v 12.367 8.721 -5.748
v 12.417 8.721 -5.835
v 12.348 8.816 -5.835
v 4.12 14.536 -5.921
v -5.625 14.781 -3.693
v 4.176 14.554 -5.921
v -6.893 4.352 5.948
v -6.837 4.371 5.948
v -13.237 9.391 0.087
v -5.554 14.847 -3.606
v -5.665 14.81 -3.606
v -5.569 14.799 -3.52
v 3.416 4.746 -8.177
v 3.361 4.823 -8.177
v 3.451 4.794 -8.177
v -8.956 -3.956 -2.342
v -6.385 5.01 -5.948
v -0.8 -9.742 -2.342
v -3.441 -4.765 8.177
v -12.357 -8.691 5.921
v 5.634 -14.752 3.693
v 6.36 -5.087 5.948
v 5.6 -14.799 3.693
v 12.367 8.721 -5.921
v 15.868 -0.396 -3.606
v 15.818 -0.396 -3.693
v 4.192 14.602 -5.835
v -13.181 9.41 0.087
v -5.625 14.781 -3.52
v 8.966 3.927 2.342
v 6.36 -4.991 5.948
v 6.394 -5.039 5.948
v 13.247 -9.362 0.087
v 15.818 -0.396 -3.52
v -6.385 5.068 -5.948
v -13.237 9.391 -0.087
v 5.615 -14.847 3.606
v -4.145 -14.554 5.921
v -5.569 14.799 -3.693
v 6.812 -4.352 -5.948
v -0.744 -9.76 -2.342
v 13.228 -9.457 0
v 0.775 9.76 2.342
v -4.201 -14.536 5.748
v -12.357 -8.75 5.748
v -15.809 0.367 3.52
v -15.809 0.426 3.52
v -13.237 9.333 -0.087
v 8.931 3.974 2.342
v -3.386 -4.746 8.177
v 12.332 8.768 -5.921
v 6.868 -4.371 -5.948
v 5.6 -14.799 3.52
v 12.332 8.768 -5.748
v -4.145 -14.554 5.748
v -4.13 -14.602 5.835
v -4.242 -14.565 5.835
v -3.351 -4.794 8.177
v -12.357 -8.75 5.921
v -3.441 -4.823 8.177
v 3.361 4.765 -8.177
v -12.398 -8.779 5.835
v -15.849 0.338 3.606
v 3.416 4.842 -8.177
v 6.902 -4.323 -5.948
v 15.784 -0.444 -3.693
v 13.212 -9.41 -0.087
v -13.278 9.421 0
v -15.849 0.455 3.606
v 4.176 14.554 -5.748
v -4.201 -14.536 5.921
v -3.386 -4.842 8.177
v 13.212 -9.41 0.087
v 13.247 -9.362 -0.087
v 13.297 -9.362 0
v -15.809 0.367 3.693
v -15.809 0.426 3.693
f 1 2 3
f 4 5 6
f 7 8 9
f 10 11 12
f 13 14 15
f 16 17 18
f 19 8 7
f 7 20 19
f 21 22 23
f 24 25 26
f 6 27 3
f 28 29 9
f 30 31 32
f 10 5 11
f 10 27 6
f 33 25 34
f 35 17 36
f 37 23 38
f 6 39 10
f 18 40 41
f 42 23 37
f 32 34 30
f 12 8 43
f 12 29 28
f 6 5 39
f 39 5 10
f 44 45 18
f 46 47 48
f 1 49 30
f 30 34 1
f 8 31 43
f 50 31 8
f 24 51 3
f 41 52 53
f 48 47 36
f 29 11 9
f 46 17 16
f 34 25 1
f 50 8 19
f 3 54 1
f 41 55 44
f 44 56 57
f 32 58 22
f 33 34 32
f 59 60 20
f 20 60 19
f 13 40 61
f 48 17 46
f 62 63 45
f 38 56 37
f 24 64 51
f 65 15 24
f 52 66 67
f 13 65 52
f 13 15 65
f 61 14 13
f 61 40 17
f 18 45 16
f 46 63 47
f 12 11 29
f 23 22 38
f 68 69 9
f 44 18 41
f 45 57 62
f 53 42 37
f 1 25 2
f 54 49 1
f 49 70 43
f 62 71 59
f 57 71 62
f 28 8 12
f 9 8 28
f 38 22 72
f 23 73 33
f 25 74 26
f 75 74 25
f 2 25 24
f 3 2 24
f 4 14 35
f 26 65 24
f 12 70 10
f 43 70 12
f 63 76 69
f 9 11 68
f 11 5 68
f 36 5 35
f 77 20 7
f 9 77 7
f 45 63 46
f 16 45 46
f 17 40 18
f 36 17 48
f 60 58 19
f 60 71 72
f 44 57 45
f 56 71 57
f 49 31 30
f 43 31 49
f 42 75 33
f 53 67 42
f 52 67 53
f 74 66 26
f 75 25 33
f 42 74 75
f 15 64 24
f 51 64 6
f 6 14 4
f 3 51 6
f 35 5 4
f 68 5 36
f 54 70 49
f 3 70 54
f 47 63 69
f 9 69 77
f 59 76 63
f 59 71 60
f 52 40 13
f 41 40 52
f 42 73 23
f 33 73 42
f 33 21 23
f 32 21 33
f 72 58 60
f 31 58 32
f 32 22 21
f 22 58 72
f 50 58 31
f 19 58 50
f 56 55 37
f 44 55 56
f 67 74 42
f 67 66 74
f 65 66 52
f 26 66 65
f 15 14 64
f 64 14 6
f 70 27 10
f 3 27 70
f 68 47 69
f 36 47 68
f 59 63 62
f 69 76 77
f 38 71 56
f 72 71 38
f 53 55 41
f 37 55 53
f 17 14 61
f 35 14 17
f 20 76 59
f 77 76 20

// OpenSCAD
// Auto-generated OpenSCAD file

    inner_points = 10*[[-1.3196803278726468, 0.9362046957981746, -6.595639077981762e-13], [1.3196795770729461, -0.9362042464911885, 6.595639077981762e-13], [-0.5584491756654331, 1.4751697470422118, -0.3606158710418413], [1.5768378417073974, -0.039640907689503124, -0.360615871040774], [-1.576838592507098, 0.039641356996489185, 0.360615871040774], [0.5584484248657327, -1.4751692977352255, 0.3606158710418413], [0.41609043726663214, 1.4506701799017077, -0.5834887362276886], [1.231697502166666, 0.8720639963146739, -0.583488736227281], [-1.2316982529663667, -0.8720635470076878, 0.583488736227281], [-0.41609118806633266, -1.4506697305947214, 0.5834887362276886], [0.3400958061980706, 0.4794020290670393, -0.8090169943749945], [-0.34009655699777114, -0.47940157976005326, 0.8090169943749945], [-0.6344438067339944, 0.5039015962075438, -0.5861441291891473], [0.685236145738802, -0.43230287493713776, -0.5861441291884877], [-0.6852368965385024, 0.4323033242441238, 0.5861441291884877], [0.634443055934294, -0.5039011469005578, 0.5861441291891473], [0.07599425566871129, 0.9712683754881611, 0.22552825814730598], [0.8916013205687453, 0.3926621919011276, 0.22552825814771355], [-0.8916020713684457, -0.39266174259414155, -0.22552825814771355], [-0.07599500646841176, -0.9712679261811751, -0.22552825814730598]];

    outer_points = 10*[[0.38730796483642055, 0.32816512550448207, 1.536337911895294], [-0.38730796483642055, -0.32816512550448207, -1.536337911895294], [1.122601014421019, -0.22411714494778695, 1.1434913451842328], [0.49592356320214137, -0.7550994719364139, -1.3423556144673943], [-0.49592356320214137, 0.7550994719364139, 1.3423556144673943], [-1.122601014421019, 0.22411714494778695, -1.1434913451842328], [1.4290986323018988, -0.6907942834915881, 0.3138699504541333], [1.189729145919442, -0.8936114849757331, -0.6356390973021997], [-1.189729145919442, 0.8936114849757331, 0.6356390973021997], [-1.4290986323018988, 0.6907942834915881, -0.3138699504541333], [0.9696619025702452, 0.0, -0.24444998405369595], [-0.9696619025702452, 0.0, 0.24444998405369595], [0.6631642846893652, 0.46667713854380116, 0.5851714106764037], [0.2758563198529447, 0.1385120130393191, -0.9511665012188903], [-0.2758563198529447, -0.1385120130393191, 0.9511665012188903], [-0.6631642846893652, -0.46667713854380116, -0.5851714106764037], [0.45943672973165367, -0.6907942834915881, 0.5583199345078292], [0.2200672433491967, -0.8936114849757331, -0.3911891132485038], [-0.2200672433491967, 0.8936114849757331, 0.3911891132485038], [-0.45943672973165367, 0.6907942834915881, -0.5583199345078292]];

    // Convex hull for inner set (I)
    module inner_hull() {
        hull() {
            for (p = inner_points) {
                translate(p) sphere(r=0.1);
            }
        }
    }

    // Convex hull for outer set (O) minus inner hull (O \ I)
    module outer_minus_inner() {
        difference() {
            hull() {
                for (p = outer_points) {
                    translate(p) sphere(r=0.1);
                }
            }
            inner_hull(); // Subtract inner hull
        }
    }

    // Convex hull for outer set (O) minus all translated inner hulls
    module outer_minus_AllTranslationInner() {
        difference() {
            hull() {
                for (p = outer_points) {
                    translate(p) sphere(r=0.1);
                }
            }
            hull() {
                translate([0,0,50]) inner_hull();
                translate([0,0,-50]) inner_hull();
            }; // Subtract translated inner hulls
        }
    }

    // Difference between outer_minus_inner and outer_minus_AllTranslationInner
    module outer_minus_inner_diff() {
        difference() {
            // Outer minus inner
            difference() {
                hull() {
                    for (p = outer_points) {
                        translate(p) sphere(r=0.1);
                    }
                }
                inner_hull();
            }

            // Subtract Outer minus AllTranslationInner
            difference() {
                hull() {
                    for (p = outer_points) {
                        translate(p) sphere(r=0.1);
                    }
                }
                hull() {
                    translate([0,0,50]) inner_hull();
                    translate([0,0,-50]) inner_hull();
                };
            }
        }
    }

    // Rendering all with colors applied
    color([1, 0, 0, 0.5]) inner_hull(); // Transparent red
    
